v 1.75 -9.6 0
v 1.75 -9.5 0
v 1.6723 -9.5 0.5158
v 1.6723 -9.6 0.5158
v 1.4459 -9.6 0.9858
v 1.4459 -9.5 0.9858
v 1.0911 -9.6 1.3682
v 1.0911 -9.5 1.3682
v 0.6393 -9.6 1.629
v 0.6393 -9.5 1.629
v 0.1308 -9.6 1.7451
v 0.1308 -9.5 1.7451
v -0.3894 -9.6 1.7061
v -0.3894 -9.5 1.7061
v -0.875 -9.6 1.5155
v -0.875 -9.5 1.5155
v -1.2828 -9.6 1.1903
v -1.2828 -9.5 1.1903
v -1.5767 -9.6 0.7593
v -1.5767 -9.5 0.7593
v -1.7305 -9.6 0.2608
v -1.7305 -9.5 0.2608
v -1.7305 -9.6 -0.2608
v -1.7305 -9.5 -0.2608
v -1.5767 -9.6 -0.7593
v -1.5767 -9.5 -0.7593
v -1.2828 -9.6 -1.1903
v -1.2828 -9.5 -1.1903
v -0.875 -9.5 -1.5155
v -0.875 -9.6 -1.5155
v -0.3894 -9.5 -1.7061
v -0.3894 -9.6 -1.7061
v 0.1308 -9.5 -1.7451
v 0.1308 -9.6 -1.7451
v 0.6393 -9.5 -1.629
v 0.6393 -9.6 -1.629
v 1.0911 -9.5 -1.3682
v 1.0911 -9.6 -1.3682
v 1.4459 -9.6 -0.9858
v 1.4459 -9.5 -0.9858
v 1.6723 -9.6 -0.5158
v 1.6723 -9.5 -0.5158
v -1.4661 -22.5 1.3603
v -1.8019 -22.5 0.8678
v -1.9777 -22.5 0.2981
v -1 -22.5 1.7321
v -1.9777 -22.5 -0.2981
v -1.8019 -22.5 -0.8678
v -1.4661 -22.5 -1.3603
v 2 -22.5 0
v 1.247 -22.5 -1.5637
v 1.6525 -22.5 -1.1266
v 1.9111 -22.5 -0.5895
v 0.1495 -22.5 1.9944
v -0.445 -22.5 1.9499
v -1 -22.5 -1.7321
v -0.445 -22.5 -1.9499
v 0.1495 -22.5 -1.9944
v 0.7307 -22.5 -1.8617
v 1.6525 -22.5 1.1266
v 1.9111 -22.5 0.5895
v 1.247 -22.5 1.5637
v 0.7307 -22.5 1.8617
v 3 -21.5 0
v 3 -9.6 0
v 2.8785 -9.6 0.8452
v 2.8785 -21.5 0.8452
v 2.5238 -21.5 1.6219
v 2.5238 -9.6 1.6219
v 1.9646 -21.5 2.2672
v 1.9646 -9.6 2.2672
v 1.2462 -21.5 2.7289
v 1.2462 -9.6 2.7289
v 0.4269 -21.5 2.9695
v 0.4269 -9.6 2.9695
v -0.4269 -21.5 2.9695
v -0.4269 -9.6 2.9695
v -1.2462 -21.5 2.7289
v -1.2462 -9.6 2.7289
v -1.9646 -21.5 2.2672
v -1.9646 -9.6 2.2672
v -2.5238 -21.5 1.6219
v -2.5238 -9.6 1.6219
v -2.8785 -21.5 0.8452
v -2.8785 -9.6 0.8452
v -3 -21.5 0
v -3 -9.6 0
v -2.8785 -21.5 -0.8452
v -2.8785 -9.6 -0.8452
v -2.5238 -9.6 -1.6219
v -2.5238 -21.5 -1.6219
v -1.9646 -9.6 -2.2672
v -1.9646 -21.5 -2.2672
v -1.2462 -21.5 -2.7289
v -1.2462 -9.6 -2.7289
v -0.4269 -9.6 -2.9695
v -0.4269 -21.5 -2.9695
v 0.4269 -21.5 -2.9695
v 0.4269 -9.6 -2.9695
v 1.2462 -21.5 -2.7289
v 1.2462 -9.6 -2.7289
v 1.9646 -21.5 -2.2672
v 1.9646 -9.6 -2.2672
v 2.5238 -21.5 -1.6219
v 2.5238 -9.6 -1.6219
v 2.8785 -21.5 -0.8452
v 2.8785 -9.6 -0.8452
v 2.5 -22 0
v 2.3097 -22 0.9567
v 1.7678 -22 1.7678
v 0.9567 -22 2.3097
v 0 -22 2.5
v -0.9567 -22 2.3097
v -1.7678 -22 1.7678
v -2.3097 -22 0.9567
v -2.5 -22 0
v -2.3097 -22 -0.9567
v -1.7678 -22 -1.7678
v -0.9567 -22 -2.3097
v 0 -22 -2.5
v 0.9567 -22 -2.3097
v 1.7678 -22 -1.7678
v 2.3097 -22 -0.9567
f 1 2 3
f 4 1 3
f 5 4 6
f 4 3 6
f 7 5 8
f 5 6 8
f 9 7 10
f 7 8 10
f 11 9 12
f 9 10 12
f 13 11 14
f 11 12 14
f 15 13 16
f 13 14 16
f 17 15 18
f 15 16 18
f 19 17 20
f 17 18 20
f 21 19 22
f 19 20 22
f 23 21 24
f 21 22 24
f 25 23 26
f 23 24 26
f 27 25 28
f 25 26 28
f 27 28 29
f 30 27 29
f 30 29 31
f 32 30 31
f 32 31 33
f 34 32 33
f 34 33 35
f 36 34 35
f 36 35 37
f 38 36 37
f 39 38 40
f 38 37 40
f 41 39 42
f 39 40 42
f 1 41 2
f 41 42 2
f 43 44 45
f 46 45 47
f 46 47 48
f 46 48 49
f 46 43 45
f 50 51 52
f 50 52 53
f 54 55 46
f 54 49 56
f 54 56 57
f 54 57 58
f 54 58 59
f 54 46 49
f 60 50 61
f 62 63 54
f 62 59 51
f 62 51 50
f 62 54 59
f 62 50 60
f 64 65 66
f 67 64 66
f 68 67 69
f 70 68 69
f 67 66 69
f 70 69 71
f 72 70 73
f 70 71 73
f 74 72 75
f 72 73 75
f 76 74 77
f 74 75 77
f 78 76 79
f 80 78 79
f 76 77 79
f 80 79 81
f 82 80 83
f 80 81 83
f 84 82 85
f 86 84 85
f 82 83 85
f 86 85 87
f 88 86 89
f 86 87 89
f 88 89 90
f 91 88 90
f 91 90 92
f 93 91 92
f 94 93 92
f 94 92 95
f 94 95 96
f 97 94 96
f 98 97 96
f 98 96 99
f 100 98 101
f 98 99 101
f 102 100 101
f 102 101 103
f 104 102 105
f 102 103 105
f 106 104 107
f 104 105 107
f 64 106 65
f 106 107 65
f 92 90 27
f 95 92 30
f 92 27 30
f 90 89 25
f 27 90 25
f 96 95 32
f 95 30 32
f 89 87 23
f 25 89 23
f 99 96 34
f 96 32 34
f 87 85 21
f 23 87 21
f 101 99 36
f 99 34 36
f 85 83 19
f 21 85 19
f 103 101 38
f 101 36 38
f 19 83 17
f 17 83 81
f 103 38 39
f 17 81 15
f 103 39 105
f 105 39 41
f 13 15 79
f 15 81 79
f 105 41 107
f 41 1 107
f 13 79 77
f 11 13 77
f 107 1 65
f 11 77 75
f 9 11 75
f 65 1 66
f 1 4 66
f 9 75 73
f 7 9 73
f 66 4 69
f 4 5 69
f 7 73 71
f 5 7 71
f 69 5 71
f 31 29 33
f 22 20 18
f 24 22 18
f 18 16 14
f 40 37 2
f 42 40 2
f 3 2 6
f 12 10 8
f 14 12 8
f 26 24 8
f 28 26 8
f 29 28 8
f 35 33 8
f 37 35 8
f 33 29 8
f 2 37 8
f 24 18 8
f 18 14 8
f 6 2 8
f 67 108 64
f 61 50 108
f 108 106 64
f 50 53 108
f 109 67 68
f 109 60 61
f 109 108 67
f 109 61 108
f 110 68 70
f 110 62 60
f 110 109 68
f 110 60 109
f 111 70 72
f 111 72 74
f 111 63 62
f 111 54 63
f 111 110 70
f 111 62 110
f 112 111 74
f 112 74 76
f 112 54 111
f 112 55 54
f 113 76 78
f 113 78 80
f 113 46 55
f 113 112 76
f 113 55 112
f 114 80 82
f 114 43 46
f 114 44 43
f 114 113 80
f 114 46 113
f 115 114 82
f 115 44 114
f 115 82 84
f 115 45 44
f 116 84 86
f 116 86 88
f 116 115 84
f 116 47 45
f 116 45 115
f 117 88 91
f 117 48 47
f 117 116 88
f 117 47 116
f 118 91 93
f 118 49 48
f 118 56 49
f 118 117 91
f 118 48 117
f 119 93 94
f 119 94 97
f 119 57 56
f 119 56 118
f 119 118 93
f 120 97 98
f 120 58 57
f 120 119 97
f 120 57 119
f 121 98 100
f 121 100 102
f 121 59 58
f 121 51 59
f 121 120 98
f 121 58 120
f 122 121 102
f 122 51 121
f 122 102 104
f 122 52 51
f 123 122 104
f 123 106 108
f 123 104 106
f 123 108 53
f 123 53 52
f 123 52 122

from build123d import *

# Parameters (mm, degrees)
SKETCH014_R  = 1.75
PAD008_DEPTH = 0.1
SKETCH015_R  = 3
PAD009_DEPTH = 12.9
CHAMFER_SIZE = 1


with BuildPart() as part:
    # Sketch014 → Pad008 (new body)
    with BuildSketch(Plane.XZ):
        Circle(SKETCH014_R)
    extrude(amount=PAD008_DEPTH)

    # Sketch015 (on Face3 of Pad008) → Pad009 (join)
    with BuildSketch(Plane.XZ.offset(0.1)):
        Circle(SKETCH015_R)
    extrude(amount=PAD009_DEPTH)

    # Chamfer
    chamfer_edges = [part.edges().sort_by_distance(p)[0] for p in [
        (-3, -13, 0),
    ]]
    chamfer(chamfer_edges, length=CHAMFER_SIZE)


with BuildPart() as part_1:
    # Body002 placement: moved
    add(part.part.moved(Location((0, -9.5, 0))))


solid = part_1.part
